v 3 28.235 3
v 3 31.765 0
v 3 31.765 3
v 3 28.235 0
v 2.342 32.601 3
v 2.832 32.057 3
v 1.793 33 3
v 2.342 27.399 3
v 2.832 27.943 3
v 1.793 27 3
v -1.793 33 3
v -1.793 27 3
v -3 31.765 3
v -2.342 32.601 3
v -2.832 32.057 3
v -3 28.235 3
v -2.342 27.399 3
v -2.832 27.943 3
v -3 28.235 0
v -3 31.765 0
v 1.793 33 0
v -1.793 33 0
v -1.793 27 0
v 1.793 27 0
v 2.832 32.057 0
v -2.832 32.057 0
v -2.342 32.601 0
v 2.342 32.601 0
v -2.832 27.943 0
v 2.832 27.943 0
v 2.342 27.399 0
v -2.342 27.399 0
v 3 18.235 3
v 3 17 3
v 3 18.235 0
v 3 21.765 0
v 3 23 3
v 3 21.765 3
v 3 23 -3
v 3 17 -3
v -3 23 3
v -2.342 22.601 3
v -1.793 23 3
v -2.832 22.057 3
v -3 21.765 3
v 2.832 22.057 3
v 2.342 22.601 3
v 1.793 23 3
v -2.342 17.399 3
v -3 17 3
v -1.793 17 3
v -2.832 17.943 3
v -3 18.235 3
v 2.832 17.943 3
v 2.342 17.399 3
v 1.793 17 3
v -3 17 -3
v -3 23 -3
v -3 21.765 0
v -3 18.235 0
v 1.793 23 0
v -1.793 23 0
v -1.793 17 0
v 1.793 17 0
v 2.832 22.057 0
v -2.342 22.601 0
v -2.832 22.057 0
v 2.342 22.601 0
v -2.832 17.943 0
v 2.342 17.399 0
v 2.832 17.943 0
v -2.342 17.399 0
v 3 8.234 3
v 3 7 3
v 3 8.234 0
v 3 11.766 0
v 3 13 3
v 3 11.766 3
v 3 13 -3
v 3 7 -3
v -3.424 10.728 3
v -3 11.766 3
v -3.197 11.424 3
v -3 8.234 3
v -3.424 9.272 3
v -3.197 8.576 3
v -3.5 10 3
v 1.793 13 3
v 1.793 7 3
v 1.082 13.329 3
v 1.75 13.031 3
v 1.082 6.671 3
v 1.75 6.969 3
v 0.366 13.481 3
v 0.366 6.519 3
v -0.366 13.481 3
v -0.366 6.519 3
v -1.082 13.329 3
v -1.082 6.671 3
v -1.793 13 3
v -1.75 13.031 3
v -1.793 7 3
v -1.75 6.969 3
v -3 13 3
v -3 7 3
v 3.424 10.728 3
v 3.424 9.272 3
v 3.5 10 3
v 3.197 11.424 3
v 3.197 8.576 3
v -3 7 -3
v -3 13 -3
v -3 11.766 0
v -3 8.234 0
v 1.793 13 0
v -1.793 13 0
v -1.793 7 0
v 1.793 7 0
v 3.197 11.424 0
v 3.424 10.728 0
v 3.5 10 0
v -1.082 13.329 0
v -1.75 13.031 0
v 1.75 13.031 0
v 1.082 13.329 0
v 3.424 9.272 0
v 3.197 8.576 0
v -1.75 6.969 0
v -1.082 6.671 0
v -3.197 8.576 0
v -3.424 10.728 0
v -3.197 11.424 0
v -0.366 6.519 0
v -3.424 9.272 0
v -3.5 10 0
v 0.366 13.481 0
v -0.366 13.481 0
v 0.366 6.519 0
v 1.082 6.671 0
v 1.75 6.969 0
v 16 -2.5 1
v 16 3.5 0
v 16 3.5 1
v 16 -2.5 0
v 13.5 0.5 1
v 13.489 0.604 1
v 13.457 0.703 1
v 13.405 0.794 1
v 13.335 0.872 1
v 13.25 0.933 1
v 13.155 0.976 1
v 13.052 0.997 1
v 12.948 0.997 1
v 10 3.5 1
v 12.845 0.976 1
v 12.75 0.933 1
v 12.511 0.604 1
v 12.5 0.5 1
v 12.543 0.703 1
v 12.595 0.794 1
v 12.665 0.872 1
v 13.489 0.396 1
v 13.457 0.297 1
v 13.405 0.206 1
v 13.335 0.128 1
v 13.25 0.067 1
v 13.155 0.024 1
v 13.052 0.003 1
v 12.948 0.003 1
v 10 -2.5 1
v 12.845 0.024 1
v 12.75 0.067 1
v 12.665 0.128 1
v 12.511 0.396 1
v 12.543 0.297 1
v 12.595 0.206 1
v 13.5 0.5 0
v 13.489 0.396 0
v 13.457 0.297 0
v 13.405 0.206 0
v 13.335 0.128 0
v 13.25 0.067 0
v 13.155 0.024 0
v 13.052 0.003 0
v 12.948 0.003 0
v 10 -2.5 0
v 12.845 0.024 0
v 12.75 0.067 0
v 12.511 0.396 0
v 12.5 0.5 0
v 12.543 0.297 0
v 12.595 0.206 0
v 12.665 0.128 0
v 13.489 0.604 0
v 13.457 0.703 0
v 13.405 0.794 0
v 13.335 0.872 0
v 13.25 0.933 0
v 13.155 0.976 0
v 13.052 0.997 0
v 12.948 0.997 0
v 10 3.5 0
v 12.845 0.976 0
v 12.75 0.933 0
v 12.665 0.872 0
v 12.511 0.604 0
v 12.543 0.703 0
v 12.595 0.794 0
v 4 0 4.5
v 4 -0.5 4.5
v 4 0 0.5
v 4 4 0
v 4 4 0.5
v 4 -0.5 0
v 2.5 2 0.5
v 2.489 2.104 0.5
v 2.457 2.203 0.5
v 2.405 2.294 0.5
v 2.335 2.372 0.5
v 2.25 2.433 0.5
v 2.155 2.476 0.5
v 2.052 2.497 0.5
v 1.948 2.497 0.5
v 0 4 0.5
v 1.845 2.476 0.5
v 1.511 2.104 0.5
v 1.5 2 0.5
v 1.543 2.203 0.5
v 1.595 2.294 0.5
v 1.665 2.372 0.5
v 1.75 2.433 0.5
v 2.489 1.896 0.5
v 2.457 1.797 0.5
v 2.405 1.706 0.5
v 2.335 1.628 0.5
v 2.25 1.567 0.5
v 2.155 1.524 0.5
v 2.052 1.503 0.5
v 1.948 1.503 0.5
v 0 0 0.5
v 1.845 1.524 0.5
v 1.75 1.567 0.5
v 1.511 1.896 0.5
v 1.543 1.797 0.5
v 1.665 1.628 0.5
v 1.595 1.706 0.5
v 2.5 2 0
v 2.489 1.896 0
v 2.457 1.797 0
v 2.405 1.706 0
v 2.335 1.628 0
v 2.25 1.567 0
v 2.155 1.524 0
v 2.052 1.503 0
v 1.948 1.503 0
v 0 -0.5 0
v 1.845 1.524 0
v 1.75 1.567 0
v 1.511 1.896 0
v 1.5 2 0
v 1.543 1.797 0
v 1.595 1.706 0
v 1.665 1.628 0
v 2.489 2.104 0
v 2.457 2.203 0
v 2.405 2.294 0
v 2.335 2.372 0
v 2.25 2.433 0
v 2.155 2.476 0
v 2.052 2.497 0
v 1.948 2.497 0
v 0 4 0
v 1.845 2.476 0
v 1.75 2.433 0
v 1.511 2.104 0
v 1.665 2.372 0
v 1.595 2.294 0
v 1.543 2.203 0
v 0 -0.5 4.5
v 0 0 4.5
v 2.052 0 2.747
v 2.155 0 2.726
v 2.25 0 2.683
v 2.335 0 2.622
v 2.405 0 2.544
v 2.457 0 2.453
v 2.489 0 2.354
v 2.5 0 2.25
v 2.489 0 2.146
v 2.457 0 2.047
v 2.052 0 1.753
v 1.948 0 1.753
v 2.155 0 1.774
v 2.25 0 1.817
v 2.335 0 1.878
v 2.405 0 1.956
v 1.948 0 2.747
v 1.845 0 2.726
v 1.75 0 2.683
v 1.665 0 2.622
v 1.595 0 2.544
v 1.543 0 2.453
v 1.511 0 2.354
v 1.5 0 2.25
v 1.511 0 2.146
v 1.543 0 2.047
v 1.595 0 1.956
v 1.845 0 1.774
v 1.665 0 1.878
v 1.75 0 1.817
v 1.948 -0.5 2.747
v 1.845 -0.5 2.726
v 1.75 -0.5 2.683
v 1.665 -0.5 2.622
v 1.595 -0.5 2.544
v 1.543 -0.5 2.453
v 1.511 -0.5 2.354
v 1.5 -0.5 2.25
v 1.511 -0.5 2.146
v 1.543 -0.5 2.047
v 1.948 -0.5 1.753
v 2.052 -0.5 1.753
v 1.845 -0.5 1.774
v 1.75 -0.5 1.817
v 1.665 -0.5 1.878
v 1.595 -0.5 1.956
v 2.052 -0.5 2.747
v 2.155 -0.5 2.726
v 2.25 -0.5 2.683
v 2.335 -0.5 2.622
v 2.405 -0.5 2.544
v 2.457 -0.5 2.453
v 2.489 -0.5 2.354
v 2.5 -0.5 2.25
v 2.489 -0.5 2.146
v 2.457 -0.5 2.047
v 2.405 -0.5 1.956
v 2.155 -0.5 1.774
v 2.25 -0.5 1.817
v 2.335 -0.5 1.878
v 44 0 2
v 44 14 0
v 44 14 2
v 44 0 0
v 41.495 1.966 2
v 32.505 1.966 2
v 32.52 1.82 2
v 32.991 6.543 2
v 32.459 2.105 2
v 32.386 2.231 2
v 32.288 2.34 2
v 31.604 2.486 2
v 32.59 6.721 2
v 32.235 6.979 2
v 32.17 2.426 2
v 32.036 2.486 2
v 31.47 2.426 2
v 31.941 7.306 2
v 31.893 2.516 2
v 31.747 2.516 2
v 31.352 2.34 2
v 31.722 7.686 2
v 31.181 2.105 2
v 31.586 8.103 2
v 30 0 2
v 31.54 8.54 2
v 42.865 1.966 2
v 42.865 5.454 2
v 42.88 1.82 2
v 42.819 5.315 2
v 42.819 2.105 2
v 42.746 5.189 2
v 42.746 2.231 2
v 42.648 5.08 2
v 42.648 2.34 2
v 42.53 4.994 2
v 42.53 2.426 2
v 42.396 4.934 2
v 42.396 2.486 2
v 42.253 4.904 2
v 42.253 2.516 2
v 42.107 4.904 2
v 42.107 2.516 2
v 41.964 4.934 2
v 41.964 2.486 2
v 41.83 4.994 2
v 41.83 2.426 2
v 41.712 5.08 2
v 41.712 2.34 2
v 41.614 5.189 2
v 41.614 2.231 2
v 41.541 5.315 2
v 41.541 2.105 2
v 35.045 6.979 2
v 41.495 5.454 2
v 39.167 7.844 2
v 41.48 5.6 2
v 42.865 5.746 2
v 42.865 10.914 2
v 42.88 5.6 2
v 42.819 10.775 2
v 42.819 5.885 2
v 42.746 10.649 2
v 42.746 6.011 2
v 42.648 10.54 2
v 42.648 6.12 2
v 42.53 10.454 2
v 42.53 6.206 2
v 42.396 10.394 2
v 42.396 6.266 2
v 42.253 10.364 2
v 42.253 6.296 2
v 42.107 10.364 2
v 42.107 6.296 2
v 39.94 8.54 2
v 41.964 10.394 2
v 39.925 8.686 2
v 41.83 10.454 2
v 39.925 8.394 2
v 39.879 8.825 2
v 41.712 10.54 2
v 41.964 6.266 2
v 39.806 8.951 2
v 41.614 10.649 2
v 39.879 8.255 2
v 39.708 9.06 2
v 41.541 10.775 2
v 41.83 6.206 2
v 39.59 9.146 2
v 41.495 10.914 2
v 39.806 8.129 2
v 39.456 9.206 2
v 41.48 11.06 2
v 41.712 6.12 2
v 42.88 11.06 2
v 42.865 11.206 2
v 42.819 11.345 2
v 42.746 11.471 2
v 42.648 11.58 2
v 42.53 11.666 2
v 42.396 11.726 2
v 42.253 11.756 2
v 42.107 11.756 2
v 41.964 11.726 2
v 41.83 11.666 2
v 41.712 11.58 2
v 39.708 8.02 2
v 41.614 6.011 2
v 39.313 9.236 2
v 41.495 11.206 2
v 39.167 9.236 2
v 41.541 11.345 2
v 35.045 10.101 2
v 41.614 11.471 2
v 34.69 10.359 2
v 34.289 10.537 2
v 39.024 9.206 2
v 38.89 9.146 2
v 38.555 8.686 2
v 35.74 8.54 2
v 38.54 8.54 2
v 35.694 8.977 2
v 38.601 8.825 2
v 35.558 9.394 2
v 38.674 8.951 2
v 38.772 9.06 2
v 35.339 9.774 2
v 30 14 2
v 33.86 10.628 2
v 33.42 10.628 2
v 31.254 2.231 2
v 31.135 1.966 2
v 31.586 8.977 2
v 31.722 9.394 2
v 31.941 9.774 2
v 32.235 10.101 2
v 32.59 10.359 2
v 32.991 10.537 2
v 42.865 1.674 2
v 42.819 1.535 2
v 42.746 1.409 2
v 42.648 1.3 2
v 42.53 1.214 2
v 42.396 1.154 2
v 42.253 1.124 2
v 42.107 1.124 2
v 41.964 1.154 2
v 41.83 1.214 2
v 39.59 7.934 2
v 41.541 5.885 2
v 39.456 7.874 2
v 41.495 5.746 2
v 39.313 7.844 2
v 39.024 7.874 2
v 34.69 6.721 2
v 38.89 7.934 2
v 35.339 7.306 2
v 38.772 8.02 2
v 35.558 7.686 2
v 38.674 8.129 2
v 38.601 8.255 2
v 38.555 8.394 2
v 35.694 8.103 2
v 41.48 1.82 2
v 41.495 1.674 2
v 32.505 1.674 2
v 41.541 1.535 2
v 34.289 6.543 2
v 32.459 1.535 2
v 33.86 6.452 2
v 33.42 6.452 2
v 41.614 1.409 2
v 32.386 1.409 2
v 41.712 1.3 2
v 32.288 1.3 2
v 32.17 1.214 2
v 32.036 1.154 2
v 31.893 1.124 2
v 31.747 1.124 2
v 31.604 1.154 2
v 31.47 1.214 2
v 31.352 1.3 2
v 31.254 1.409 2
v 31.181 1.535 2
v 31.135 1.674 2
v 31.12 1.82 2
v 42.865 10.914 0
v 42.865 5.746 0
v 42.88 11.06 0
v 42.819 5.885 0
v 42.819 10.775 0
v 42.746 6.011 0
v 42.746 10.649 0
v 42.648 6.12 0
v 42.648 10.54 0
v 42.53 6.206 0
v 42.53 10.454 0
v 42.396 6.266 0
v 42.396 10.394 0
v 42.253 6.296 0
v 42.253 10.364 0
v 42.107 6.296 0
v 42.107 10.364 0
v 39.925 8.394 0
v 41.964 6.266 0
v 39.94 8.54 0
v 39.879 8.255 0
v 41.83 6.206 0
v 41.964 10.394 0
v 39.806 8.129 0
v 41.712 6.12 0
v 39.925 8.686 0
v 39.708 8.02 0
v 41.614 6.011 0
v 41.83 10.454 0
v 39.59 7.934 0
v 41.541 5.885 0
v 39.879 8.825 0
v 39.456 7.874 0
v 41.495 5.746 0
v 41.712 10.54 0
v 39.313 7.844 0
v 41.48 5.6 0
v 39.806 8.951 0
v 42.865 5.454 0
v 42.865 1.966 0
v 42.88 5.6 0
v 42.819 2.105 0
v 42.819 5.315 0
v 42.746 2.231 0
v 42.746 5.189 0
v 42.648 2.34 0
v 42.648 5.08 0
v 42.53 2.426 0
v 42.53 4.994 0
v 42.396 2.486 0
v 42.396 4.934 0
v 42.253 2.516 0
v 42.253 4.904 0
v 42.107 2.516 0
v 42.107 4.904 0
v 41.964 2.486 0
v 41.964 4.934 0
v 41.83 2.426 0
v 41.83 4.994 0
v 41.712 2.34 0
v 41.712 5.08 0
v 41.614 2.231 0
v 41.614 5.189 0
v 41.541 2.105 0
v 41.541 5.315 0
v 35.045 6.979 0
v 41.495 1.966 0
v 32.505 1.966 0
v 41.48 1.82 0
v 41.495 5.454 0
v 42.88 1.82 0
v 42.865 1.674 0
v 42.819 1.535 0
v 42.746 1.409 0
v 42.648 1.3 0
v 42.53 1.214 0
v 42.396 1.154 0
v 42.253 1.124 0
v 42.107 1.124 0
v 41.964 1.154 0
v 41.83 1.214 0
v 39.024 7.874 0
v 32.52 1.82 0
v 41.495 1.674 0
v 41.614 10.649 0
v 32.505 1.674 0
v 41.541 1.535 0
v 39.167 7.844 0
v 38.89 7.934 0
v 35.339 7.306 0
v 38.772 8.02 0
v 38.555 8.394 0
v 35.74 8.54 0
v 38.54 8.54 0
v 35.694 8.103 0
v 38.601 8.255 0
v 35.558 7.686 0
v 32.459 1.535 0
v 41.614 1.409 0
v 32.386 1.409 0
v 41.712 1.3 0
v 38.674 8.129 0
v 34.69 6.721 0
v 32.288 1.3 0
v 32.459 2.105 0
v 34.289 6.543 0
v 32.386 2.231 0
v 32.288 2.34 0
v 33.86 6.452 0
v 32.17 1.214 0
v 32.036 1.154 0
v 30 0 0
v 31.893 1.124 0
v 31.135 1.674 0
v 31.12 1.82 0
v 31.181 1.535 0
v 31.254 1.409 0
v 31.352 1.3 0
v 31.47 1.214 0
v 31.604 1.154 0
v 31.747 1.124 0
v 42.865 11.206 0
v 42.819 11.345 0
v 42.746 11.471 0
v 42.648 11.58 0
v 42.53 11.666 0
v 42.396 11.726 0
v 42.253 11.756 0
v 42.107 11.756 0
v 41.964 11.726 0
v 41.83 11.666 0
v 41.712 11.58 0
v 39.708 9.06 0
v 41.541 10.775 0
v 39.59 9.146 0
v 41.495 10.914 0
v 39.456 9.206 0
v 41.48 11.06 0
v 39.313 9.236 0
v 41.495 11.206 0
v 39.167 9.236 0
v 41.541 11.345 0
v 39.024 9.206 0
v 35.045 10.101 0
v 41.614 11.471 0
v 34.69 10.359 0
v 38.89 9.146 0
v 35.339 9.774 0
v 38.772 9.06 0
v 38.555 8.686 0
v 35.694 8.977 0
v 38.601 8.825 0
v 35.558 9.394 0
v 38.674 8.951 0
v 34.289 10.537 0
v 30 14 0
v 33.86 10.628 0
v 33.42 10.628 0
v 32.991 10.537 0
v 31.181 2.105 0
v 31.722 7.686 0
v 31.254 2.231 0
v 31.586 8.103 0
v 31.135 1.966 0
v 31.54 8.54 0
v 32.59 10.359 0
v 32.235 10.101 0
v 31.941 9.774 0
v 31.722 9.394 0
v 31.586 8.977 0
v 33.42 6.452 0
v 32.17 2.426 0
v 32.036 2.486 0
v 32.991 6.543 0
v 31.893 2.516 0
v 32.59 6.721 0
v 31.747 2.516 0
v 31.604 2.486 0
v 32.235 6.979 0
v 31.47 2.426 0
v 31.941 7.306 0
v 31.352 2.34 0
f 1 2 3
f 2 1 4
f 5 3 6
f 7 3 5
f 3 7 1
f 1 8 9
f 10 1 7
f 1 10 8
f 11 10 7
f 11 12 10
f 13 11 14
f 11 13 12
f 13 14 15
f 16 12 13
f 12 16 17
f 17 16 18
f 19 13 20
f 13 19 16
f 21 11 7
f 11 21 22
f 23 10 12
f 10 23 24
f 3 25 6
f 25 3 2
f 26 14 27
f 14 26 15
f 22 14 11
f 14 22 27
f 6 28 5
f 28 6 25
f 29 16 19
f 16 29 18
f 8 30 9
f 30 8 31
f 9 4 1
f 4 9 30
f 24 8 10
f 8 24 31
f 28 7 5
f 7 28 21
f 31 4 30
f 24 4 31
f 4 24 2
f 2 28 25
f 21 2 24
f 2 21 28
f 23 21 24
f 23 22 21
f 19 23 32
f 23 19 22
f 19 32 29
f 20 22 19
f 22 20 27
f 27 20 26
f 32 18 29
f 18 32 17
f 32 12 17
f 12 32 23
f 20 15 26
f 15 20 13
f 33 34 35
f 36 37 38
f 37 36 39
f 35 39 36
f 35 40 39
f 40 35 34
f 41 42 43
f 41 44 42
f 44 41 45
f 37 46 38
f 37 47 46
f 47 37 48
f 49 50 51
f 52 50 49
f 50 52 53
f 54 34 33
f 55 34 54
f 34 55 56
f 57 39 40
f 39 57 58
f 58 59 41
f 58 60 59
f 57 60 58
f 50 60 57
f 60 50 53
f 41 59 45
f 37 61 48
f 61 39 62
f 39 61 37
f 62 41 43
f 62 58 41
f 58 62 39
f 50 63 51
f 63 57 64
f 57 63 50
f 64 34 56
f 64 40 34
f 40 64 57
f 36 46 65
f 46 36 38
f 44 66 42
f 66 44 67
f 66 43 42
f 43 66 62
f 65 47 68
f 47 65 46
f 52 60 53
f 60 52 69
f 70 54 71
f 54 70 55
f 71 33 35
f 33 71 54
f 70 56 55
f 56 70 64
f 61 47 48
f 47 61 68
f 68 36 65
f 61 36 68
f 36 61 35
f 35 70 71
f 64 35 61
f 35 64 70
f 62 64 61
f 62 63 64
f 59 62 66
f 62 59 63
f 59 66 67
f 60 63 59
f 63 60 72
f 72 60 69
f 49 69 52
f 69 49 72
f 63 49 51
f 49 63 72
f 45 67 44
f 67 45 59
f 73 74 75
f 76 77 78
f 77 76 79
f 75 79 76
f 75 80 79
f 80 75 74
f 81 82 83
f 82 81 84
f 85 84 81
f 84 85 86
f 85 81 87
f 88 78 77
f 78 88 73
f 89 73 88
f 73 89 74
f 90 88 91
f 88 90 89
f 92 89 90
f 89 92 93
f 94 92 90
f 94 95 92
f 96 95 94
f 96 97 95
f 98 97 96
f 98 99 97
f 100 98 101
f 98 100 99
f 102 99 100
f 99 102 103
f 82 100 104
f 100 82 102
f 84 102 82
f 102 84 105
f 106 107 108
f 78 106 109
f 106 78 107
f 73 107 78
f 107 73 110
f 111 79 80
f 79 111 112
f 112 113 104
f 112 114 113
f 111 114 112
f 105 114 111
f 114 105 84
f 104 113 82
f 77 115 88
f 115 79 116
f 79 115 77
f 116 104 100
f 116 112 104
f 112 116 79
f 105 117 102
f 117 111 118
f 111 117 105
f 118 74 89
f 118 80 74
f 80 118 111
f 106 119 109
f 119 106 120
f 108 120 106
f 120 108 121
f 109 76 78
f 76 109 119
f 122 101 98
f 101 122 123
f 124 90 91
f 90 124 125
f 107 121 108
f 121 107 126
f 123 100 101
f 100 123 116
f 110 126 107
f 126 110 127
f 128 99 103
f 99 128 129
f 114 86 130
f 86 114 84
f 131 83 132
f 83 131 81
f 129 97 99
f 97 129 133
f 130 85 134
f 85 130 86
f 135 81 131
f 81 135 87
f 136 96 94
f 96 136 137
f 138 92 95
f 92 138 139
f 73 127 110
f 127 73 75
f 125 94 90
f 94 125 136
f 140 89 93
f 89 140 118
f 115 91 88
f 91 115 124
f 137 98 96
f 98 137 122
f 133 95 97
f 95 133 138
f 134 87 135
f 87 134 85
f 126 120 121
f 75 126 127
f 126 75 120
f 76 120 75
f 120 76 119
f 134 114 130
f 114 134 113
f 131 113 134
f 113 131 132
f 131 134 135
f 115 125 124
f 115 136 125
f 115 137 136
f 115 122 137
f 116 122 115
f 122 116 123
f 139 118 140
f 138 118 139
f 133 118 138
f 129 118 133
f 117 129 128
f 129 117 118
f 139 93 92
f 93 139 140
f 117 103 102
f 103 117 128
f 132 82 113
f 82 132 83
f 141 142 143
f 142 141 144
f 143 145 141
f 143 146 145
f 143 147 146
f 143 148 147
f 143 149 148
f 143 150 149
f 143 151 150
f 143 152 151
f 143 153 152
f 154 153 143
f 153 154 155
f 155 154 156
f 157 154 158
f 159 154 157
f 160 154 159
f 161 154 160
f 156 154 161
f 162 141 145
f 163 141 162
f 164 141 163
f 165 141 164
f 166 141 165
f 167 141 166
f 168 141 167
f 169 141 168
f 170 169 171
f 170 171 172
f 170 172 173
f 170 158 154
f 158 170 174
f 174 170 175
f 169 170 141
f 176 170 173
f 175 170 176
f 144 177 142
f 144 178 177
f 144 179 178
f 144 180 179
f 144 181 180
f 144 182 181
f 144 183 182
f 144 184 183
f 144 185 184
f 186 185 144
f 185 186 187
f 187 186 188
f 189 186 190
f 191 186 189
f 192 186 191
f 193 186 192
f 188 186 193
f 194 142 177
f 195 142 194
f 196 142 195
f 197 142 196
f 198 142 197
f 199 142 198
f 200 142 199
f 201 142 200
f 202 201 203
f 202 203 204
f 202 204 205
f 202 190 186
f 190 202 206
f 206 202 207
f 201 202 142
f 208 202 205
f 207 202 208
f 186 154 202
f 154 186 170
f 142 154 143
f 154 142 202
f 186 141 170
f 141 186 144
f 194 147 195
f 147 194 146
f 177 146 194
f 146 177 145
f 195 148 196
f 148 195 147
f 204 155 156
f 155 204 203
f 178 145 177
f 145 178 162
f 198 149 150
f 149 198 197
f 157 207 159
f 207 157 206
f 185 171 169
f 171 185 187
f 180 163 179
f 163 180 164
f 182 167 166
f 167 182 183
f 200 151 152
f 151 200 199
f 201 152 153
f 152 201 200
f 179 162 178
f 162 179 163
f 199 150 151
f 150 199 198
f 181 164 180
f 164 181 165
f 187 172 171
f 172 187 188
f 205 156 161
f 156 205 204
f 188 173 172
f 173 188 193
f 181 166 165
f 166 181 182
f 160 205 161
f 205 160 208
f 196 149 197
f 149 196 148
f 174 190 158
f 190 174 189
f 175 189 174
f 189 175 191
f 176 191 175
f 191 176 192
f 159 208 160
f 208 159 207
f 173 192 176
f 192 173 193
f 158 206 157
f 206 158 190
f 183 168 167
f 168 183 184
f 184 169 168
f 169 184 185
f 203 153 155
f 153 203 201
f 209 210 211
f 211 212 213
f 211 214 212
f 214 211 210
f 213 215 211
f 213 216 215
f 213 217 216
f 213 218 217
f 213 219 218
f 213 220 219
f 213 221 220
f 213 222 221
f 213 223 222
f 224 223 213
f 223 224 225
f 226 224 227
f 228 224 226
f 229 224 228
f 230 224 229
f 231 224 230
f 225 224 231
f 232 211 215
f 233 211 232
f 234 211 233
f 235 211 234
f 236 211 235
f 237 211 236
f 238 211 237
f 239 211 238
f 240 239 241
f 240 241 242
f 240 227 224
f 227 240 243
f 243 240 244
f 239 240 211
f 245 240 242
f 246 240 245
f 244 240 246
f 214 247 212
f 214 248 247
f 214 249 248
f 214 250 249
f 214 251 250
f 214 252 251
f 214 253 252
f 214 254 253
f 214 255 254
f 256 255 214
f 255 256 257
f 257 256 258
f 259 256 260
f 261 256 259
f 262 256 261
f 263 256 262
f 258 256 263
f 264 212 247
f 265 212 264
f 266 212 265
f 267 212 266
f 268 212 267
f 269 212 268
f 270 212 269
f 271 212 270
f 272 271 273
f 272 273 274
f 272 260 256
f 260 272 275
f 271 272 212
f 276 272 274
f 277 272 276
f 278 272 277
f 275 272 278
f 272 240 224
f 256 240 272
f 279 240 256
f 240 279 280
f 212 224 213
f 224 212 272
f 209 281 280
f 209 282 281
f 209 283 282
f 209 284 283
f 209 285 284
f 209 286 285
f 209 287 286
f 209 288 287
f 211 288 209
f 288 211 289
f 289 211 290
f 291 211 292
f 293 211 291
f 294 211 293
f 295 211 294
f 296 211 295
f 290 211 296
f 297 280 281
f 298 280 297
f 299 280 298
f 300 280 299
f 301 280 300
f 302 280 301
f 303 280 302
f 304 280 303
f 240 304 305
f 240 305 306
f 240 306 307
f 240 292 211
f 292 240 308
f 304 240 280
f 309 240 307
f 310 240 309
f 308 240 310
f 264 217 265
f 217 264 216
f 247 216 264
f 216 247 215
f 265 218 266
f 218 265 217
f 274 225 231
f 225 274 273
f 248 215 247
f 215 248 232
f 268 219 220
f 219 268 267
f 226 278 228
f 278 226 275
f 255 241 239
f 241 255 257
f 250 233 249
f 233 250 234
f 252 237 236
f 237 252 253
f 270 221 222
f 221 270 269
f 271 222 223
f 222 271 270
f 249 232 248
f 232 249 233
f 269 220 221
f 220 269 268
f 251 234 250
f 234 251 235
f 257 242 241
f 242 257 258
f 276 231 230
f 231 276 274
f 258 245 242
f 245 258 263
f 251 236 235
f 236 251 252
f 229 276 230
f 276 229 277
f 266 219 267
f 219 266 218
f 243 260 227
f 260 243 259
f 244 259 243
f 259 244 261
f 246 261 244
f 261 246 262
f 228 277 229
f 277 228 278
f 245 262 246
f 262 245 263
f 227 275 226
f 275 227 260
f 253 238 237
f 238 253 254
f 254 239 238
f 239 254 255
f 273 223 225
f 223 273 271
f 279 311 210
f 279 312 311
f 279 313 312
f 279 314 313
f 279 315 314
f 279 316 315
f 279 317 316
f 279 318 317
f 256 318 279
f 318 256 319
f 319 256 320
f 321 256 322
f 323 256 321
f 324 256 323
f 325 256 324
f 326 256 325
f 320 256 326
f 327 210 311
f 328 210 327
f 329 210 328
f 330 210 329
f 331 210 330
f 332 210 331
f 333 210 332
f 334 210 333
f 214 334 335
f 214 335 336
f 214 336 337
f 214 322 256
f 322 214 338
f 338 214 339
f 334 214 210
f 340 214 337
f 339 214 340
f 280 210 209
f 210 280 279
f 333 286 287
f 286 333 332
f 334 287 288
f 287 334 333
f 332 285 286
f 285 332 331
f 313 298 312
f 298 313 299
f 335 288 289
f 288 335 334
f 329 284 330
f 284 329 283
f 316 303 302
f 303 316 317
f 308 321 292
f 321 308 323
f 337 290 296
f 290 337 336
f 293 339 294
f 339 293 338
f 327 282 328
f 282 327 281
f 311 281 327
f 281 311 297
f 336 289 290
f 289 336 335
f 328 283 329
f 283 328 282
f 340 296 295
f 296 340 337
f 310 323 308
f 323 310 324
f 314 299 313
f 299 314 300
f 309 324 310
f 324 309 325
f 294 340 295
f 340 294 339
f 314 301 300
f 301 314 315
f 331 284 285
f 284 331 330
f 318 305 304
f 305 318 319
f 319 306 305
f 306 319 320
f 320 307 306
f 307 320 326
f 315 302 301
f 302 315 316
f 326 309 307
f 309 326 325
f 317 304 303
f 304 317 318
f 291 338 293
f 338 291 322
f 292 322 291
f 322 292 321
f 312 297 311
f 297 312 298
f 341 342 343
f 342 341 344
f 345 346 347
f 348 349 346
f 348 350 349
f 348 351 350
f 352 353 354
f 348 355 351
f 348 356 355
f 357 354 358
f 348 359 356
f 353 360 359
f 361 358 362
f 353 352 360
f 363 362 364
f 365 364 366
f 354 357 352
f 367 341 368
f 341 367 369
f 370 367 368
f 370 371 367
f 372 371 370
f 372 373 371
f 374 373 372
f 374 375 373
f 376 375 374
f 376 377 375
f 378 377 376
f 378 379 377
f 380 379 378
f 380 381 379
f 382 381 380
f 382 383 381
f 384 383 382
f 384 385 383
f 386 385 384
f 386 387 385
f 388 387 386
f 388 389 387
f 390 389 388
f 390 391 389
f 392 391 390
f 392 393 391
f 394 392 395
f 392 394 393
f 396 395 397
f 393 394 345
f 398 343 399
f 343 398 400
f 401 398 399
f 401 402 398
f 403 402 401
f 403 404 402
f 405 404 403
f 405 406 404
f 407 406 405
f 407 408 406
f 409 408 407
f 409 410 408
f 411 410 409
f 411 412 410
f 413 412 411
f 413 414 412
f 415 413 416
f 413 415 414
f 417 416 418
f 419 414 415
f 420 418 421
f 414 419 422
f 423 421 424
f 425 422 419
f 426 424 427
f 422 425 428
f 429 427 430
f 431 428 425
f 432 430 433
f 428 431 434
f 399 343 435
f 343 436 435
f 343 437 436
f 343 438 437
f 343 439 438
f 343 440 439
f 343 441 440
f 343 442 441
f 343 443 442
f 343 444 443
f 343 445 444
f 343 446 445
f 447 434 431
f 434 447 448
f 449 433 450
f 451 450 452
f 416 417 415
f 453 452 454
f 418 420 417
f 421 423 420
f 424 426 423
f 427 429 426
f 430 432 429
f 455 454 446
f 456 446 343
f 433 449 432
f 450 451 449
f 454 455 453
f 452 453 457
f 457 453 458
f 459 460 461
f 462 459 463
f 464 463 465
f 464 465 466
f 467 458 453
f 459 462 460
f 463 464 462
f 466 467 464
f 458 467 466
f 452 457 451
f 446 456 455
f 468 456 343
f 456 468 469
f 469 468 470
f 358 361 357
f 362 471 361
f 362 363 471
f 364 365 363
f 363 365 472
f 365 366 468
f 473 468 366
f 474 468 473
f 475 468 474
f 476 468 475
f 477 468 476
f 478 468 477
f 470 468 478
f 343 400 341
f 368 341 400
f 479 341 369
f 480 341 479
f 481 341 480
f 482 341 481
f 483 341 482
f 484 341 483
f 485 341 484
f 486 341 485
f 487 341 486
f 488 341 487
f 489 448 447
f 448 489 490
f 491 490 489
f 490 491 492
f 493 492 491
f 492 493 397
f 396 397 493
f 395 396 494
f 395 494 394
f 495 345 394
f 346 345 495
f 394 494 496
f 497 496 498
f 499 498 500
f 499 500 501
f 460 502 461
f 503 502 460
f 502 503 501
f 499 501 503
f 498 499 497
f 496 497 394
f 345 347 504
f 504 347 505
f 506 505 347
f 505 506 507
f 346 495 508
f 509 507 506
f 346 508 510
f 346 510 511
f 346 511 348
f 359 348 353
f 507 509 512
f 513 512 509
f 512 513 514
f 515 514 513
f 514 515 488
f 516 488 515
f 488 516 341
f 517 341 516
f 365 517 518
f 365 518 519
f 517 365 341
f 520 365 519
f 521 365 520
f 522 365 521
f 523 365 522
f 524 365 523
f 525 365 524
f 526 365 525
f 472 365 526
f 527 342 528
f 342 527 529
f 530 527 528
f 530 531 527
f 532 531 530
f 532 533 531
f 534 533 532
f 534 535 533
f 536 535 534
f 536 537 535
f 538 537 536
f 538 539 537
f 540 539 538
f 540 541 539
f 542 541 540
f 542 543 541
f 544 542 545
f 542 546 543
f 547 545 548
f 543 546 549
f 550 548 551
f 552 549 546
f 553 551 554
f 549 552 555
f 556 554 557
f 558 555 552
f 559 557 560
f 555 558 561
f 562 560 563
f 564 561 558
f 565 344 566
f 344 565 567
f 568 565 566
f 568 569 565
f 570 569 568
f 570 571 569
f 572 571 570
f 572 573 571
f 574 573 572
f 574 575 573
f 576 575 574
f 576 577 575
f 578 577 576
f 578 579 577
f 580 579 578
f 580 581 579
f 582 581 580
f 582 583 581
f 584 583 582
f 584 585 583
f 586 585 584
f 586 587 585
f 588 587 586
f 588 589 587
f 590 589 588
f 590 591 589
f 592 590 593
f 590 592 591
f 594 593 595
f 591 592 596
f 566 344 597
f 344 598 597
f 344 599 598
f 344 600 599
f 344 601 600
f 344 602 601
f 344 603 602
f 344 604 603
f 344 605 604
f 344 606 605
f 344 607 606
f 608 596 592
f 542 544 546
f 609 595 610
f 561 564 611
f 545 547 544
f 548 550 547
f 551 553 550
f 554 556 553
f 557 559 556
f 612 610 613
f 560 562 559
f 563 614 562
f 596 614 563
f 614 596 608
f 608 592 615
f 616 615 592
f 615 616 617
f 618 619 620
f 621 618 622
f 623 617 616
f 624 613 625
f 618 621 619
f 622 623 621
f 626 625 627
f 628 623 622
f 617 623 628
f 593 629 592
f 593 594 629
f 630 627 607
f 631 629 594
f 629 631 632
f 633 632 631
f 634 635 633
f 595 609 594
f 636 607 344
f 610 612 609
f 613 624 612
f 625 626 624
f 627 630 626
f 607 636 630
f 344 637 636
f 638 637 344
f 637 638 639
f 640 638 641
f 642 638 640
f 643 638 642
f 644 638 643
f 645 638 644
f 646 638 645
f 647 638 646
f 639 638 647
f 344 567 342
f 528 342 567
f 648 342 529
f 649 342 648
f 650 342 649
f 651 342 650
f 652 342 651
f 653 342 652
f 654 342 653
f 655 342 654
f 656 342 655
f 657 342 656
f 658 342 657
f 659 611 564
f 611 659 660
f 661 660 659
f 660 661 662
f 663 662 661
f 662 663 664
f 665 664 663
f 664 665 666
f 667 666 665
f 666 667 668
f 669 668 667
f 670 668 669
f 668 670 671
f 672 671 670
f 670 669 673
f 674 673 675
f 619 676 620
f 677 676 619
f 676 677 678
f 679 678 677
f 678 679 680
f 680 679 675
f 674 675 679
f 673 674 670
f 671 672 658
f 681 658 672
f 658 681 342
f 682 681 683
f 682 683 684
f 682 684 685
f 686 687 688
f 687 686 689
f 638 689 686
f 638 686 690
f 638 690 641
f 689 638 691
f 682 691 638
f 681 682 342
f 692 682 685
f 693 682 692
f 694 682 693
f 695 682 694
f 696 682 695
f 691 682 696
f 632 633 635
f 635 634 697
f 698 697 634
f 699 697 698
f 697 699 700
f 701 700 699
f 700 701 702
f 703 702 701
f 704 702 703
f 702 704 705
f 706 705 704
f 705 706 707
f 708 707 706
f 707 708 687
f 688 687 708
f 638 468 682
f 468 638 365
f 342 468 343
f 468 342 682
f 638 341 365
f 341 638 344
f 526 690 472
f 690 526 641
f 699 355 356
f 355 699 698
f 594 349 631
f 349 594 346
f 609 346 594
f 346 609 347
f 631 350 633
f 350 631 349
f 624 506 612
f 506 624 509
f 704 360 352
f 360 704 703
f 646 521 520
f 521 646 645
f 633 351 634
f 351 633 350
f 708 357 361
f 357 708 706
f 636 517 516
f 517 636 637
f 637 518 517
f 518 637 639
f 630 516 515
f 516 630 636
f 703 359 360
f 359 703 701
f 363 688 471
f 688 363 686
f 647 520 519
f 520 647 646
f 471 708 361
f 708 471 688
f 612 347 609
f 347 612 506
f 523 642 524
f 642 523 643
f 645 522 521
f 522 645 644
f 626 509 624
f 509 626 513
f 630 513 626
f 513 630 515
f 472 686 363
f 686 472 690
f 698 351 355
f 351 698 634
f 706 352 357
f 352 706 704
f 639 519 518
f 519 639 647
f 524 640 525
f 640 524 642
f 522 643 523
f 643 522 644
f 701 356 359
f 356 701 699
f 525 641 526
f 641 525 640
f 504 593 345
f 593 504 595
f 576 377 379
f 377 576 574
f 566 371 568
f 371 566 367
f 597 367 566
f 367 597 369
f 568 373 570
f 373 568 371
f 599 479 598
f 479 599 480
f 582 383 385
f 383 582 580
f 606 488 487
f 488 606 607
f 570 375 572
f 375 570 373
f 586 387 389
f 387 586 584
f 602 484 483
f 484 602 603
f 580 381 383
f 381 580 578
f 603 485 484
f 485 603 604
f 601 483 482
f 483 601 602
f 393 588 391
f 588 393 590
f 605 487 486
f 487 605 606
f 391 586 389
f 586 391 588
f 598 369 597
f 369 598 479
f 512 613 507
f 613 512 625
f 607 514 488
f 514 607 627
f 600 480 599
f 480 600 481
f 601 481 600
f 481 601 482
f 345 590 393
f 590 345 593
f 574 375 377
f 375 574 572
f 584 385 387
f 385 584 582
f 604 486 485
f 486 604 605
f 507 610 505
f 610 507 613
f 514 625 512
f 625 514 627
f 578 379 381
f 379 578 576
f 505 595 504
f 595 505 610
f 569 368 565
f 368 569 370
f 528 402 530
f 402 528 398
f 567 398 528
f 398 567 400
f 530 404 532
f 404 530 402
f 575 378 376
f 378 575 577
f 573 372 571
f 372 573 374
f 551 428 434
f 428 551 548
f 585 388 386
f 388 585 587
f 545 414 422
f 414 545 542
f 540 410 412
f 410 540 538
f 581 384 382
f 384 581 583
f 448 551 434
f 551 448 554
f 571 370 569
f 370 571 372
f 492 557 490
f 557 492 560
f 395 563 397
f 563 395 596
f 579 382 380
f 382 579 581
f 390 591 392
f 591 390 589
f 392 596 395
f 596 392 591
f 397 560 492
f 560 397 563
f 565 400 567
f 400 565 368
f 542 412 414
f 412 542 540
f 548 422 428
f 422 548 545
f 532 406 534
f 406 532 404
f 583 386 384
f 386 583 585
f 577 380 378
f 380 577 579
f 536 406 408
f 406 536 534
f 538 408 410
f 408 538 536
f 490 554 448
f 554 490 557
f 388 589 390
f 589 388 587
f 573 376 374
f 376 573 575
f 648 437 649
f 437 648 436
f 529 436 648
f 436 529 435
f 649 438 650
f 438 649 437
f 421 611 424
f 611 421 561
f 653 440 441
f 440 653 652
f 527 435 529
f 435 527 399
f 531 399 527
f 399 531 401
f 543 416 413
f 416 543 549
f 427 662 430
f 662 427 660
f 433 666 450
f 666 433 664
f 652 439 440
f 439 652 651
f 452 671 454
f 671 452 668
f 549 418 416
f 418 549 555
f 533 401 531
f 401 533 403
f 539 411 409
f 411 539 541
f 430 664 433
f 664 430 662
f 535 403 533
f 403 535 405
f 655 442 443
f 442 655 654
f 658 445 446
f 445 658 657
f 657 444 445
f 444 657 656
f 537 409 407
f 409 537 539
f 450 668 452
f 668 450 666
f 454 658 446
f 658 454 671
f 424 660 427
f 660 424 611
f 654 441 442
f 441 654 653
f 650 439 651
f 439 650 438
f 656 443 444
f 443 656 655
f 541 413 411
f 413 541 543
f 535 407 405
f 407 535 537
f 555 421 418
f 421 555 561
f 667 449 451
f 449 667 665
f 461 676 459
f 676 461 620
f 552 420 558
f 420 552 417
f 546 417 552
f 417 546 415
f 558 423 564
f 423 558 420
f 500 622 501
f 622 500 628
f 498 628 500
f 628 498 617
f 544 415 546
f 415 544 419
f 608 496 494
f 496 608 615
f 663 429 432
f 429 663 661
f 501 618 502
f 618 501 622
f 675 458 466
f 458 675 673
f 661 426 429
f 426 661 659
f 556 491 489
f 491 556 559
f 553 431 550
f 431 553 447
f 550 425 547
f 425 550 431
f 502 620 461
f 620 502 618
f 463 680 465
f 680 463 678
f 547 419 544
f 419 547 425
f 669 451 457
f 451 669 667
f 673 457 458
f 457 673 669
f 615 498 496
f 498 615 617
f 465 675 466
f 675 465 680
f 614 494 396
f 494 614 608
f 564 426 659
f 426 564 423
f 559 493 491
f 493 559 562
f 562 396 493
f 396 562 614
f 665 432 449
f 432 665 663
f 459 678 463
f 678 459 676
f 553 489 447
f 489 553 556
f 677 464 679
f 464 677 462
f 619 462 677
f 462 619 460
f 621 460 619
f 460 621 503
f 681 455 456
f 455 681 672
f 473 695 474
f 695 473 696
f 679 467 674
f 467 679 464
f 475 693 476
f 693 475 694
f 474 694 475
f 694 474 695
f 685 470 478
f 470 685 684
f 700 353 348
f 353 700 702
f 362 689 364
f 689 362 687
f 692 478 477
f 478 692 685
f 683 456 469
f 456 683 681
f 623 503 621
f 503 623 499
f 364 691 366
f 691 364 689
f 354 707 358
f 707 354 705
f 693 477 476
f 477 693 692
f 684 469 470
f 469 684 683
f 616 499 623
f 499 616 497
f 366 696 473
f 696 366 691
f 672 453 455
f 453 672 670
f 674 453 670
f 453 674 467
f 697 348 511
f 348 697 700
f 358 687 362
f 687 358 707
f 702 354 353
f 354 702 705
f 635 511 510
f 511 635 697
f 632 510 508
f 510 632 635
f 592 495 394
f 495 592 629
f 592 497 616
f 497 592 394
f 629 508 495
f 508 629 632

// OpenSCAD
$fn=30;
translate([0,30,0]) intersection(){
cube([6,6,6],center=true);
    cylinder(h=3,r=3.5);
}
translate([0,20,0]) difference(){
cube([6,6,6],center=true);
    cylinder(h=3,r=3.5);
}
translate([0,10,0]) union(){
cube([6,6,6],center=true);
    cylinder(h=3,r=3.5);
}




module plate(length,width,thickness){
    difference(){
translate([0,0,0]) cube([length,width,thickness]);
translate([length/2,width/2,0]) cylinder(r=.5,h=1);
}
}
translate([10,-2.5,0]) plate(6,6,1);

//rotate(a=45,v=[1,0,0]){ translate([20,-2.5,0]) plate(6,6,1);}

module bracket(length,width,thickness){
plate(length,width,thickness);
rotate(a=90,v=[1,0,0]) plate(length,width+thickness,thickness);
}
bracket(4,4,.5);


$fn=30;
mount_width=10;
mount_length=10 ;
mount_thickness=2;
mount_screw_hole_radius=mount_width/20;
startposx=30;
startposy=0;
startposz=0;
mscrew1pos=[startposx+5,startposy+5,startposz];
scalesize=1.4;
translate([startposx,startposy,startposz]) scale([scalesize,scalesize,1])  difference(){
cube([mount_width,mount_length,mount_thickness]);
translate([mount_width*.13,mount_length*.13,0]) cylinder(mount_thickness,mount_screw_hole_radius,mount_screw_hole_radius);
translate([mount_width*.87,mount_length*.13,0]) cylinder(mount_thickness,mount_screw_hole_radius,mount_screw_hole_radius);
translate([mount_width*.87,mount_length*.4,0]) cylinder(mount_thickness,mount_screw_hole_radius,mount_screw_hole_radius);
translate([mount_width*.87,mount_length*.79,0]) cylinder(mount_thickness,mount_screw_hole_radius,mount_screw_hole_radius);
translate([mount_width*.66,mount_length*.61,0]) cylinder(mount_thickness,mount_screw_hole_radius,mount_screw_hole_radius);
translate([mount_width*.26,mount_length*.61,0]) cylinder(mount_thickness,mount_screw_hole_radius*3,mount_screw_hole_radius*3);
}
